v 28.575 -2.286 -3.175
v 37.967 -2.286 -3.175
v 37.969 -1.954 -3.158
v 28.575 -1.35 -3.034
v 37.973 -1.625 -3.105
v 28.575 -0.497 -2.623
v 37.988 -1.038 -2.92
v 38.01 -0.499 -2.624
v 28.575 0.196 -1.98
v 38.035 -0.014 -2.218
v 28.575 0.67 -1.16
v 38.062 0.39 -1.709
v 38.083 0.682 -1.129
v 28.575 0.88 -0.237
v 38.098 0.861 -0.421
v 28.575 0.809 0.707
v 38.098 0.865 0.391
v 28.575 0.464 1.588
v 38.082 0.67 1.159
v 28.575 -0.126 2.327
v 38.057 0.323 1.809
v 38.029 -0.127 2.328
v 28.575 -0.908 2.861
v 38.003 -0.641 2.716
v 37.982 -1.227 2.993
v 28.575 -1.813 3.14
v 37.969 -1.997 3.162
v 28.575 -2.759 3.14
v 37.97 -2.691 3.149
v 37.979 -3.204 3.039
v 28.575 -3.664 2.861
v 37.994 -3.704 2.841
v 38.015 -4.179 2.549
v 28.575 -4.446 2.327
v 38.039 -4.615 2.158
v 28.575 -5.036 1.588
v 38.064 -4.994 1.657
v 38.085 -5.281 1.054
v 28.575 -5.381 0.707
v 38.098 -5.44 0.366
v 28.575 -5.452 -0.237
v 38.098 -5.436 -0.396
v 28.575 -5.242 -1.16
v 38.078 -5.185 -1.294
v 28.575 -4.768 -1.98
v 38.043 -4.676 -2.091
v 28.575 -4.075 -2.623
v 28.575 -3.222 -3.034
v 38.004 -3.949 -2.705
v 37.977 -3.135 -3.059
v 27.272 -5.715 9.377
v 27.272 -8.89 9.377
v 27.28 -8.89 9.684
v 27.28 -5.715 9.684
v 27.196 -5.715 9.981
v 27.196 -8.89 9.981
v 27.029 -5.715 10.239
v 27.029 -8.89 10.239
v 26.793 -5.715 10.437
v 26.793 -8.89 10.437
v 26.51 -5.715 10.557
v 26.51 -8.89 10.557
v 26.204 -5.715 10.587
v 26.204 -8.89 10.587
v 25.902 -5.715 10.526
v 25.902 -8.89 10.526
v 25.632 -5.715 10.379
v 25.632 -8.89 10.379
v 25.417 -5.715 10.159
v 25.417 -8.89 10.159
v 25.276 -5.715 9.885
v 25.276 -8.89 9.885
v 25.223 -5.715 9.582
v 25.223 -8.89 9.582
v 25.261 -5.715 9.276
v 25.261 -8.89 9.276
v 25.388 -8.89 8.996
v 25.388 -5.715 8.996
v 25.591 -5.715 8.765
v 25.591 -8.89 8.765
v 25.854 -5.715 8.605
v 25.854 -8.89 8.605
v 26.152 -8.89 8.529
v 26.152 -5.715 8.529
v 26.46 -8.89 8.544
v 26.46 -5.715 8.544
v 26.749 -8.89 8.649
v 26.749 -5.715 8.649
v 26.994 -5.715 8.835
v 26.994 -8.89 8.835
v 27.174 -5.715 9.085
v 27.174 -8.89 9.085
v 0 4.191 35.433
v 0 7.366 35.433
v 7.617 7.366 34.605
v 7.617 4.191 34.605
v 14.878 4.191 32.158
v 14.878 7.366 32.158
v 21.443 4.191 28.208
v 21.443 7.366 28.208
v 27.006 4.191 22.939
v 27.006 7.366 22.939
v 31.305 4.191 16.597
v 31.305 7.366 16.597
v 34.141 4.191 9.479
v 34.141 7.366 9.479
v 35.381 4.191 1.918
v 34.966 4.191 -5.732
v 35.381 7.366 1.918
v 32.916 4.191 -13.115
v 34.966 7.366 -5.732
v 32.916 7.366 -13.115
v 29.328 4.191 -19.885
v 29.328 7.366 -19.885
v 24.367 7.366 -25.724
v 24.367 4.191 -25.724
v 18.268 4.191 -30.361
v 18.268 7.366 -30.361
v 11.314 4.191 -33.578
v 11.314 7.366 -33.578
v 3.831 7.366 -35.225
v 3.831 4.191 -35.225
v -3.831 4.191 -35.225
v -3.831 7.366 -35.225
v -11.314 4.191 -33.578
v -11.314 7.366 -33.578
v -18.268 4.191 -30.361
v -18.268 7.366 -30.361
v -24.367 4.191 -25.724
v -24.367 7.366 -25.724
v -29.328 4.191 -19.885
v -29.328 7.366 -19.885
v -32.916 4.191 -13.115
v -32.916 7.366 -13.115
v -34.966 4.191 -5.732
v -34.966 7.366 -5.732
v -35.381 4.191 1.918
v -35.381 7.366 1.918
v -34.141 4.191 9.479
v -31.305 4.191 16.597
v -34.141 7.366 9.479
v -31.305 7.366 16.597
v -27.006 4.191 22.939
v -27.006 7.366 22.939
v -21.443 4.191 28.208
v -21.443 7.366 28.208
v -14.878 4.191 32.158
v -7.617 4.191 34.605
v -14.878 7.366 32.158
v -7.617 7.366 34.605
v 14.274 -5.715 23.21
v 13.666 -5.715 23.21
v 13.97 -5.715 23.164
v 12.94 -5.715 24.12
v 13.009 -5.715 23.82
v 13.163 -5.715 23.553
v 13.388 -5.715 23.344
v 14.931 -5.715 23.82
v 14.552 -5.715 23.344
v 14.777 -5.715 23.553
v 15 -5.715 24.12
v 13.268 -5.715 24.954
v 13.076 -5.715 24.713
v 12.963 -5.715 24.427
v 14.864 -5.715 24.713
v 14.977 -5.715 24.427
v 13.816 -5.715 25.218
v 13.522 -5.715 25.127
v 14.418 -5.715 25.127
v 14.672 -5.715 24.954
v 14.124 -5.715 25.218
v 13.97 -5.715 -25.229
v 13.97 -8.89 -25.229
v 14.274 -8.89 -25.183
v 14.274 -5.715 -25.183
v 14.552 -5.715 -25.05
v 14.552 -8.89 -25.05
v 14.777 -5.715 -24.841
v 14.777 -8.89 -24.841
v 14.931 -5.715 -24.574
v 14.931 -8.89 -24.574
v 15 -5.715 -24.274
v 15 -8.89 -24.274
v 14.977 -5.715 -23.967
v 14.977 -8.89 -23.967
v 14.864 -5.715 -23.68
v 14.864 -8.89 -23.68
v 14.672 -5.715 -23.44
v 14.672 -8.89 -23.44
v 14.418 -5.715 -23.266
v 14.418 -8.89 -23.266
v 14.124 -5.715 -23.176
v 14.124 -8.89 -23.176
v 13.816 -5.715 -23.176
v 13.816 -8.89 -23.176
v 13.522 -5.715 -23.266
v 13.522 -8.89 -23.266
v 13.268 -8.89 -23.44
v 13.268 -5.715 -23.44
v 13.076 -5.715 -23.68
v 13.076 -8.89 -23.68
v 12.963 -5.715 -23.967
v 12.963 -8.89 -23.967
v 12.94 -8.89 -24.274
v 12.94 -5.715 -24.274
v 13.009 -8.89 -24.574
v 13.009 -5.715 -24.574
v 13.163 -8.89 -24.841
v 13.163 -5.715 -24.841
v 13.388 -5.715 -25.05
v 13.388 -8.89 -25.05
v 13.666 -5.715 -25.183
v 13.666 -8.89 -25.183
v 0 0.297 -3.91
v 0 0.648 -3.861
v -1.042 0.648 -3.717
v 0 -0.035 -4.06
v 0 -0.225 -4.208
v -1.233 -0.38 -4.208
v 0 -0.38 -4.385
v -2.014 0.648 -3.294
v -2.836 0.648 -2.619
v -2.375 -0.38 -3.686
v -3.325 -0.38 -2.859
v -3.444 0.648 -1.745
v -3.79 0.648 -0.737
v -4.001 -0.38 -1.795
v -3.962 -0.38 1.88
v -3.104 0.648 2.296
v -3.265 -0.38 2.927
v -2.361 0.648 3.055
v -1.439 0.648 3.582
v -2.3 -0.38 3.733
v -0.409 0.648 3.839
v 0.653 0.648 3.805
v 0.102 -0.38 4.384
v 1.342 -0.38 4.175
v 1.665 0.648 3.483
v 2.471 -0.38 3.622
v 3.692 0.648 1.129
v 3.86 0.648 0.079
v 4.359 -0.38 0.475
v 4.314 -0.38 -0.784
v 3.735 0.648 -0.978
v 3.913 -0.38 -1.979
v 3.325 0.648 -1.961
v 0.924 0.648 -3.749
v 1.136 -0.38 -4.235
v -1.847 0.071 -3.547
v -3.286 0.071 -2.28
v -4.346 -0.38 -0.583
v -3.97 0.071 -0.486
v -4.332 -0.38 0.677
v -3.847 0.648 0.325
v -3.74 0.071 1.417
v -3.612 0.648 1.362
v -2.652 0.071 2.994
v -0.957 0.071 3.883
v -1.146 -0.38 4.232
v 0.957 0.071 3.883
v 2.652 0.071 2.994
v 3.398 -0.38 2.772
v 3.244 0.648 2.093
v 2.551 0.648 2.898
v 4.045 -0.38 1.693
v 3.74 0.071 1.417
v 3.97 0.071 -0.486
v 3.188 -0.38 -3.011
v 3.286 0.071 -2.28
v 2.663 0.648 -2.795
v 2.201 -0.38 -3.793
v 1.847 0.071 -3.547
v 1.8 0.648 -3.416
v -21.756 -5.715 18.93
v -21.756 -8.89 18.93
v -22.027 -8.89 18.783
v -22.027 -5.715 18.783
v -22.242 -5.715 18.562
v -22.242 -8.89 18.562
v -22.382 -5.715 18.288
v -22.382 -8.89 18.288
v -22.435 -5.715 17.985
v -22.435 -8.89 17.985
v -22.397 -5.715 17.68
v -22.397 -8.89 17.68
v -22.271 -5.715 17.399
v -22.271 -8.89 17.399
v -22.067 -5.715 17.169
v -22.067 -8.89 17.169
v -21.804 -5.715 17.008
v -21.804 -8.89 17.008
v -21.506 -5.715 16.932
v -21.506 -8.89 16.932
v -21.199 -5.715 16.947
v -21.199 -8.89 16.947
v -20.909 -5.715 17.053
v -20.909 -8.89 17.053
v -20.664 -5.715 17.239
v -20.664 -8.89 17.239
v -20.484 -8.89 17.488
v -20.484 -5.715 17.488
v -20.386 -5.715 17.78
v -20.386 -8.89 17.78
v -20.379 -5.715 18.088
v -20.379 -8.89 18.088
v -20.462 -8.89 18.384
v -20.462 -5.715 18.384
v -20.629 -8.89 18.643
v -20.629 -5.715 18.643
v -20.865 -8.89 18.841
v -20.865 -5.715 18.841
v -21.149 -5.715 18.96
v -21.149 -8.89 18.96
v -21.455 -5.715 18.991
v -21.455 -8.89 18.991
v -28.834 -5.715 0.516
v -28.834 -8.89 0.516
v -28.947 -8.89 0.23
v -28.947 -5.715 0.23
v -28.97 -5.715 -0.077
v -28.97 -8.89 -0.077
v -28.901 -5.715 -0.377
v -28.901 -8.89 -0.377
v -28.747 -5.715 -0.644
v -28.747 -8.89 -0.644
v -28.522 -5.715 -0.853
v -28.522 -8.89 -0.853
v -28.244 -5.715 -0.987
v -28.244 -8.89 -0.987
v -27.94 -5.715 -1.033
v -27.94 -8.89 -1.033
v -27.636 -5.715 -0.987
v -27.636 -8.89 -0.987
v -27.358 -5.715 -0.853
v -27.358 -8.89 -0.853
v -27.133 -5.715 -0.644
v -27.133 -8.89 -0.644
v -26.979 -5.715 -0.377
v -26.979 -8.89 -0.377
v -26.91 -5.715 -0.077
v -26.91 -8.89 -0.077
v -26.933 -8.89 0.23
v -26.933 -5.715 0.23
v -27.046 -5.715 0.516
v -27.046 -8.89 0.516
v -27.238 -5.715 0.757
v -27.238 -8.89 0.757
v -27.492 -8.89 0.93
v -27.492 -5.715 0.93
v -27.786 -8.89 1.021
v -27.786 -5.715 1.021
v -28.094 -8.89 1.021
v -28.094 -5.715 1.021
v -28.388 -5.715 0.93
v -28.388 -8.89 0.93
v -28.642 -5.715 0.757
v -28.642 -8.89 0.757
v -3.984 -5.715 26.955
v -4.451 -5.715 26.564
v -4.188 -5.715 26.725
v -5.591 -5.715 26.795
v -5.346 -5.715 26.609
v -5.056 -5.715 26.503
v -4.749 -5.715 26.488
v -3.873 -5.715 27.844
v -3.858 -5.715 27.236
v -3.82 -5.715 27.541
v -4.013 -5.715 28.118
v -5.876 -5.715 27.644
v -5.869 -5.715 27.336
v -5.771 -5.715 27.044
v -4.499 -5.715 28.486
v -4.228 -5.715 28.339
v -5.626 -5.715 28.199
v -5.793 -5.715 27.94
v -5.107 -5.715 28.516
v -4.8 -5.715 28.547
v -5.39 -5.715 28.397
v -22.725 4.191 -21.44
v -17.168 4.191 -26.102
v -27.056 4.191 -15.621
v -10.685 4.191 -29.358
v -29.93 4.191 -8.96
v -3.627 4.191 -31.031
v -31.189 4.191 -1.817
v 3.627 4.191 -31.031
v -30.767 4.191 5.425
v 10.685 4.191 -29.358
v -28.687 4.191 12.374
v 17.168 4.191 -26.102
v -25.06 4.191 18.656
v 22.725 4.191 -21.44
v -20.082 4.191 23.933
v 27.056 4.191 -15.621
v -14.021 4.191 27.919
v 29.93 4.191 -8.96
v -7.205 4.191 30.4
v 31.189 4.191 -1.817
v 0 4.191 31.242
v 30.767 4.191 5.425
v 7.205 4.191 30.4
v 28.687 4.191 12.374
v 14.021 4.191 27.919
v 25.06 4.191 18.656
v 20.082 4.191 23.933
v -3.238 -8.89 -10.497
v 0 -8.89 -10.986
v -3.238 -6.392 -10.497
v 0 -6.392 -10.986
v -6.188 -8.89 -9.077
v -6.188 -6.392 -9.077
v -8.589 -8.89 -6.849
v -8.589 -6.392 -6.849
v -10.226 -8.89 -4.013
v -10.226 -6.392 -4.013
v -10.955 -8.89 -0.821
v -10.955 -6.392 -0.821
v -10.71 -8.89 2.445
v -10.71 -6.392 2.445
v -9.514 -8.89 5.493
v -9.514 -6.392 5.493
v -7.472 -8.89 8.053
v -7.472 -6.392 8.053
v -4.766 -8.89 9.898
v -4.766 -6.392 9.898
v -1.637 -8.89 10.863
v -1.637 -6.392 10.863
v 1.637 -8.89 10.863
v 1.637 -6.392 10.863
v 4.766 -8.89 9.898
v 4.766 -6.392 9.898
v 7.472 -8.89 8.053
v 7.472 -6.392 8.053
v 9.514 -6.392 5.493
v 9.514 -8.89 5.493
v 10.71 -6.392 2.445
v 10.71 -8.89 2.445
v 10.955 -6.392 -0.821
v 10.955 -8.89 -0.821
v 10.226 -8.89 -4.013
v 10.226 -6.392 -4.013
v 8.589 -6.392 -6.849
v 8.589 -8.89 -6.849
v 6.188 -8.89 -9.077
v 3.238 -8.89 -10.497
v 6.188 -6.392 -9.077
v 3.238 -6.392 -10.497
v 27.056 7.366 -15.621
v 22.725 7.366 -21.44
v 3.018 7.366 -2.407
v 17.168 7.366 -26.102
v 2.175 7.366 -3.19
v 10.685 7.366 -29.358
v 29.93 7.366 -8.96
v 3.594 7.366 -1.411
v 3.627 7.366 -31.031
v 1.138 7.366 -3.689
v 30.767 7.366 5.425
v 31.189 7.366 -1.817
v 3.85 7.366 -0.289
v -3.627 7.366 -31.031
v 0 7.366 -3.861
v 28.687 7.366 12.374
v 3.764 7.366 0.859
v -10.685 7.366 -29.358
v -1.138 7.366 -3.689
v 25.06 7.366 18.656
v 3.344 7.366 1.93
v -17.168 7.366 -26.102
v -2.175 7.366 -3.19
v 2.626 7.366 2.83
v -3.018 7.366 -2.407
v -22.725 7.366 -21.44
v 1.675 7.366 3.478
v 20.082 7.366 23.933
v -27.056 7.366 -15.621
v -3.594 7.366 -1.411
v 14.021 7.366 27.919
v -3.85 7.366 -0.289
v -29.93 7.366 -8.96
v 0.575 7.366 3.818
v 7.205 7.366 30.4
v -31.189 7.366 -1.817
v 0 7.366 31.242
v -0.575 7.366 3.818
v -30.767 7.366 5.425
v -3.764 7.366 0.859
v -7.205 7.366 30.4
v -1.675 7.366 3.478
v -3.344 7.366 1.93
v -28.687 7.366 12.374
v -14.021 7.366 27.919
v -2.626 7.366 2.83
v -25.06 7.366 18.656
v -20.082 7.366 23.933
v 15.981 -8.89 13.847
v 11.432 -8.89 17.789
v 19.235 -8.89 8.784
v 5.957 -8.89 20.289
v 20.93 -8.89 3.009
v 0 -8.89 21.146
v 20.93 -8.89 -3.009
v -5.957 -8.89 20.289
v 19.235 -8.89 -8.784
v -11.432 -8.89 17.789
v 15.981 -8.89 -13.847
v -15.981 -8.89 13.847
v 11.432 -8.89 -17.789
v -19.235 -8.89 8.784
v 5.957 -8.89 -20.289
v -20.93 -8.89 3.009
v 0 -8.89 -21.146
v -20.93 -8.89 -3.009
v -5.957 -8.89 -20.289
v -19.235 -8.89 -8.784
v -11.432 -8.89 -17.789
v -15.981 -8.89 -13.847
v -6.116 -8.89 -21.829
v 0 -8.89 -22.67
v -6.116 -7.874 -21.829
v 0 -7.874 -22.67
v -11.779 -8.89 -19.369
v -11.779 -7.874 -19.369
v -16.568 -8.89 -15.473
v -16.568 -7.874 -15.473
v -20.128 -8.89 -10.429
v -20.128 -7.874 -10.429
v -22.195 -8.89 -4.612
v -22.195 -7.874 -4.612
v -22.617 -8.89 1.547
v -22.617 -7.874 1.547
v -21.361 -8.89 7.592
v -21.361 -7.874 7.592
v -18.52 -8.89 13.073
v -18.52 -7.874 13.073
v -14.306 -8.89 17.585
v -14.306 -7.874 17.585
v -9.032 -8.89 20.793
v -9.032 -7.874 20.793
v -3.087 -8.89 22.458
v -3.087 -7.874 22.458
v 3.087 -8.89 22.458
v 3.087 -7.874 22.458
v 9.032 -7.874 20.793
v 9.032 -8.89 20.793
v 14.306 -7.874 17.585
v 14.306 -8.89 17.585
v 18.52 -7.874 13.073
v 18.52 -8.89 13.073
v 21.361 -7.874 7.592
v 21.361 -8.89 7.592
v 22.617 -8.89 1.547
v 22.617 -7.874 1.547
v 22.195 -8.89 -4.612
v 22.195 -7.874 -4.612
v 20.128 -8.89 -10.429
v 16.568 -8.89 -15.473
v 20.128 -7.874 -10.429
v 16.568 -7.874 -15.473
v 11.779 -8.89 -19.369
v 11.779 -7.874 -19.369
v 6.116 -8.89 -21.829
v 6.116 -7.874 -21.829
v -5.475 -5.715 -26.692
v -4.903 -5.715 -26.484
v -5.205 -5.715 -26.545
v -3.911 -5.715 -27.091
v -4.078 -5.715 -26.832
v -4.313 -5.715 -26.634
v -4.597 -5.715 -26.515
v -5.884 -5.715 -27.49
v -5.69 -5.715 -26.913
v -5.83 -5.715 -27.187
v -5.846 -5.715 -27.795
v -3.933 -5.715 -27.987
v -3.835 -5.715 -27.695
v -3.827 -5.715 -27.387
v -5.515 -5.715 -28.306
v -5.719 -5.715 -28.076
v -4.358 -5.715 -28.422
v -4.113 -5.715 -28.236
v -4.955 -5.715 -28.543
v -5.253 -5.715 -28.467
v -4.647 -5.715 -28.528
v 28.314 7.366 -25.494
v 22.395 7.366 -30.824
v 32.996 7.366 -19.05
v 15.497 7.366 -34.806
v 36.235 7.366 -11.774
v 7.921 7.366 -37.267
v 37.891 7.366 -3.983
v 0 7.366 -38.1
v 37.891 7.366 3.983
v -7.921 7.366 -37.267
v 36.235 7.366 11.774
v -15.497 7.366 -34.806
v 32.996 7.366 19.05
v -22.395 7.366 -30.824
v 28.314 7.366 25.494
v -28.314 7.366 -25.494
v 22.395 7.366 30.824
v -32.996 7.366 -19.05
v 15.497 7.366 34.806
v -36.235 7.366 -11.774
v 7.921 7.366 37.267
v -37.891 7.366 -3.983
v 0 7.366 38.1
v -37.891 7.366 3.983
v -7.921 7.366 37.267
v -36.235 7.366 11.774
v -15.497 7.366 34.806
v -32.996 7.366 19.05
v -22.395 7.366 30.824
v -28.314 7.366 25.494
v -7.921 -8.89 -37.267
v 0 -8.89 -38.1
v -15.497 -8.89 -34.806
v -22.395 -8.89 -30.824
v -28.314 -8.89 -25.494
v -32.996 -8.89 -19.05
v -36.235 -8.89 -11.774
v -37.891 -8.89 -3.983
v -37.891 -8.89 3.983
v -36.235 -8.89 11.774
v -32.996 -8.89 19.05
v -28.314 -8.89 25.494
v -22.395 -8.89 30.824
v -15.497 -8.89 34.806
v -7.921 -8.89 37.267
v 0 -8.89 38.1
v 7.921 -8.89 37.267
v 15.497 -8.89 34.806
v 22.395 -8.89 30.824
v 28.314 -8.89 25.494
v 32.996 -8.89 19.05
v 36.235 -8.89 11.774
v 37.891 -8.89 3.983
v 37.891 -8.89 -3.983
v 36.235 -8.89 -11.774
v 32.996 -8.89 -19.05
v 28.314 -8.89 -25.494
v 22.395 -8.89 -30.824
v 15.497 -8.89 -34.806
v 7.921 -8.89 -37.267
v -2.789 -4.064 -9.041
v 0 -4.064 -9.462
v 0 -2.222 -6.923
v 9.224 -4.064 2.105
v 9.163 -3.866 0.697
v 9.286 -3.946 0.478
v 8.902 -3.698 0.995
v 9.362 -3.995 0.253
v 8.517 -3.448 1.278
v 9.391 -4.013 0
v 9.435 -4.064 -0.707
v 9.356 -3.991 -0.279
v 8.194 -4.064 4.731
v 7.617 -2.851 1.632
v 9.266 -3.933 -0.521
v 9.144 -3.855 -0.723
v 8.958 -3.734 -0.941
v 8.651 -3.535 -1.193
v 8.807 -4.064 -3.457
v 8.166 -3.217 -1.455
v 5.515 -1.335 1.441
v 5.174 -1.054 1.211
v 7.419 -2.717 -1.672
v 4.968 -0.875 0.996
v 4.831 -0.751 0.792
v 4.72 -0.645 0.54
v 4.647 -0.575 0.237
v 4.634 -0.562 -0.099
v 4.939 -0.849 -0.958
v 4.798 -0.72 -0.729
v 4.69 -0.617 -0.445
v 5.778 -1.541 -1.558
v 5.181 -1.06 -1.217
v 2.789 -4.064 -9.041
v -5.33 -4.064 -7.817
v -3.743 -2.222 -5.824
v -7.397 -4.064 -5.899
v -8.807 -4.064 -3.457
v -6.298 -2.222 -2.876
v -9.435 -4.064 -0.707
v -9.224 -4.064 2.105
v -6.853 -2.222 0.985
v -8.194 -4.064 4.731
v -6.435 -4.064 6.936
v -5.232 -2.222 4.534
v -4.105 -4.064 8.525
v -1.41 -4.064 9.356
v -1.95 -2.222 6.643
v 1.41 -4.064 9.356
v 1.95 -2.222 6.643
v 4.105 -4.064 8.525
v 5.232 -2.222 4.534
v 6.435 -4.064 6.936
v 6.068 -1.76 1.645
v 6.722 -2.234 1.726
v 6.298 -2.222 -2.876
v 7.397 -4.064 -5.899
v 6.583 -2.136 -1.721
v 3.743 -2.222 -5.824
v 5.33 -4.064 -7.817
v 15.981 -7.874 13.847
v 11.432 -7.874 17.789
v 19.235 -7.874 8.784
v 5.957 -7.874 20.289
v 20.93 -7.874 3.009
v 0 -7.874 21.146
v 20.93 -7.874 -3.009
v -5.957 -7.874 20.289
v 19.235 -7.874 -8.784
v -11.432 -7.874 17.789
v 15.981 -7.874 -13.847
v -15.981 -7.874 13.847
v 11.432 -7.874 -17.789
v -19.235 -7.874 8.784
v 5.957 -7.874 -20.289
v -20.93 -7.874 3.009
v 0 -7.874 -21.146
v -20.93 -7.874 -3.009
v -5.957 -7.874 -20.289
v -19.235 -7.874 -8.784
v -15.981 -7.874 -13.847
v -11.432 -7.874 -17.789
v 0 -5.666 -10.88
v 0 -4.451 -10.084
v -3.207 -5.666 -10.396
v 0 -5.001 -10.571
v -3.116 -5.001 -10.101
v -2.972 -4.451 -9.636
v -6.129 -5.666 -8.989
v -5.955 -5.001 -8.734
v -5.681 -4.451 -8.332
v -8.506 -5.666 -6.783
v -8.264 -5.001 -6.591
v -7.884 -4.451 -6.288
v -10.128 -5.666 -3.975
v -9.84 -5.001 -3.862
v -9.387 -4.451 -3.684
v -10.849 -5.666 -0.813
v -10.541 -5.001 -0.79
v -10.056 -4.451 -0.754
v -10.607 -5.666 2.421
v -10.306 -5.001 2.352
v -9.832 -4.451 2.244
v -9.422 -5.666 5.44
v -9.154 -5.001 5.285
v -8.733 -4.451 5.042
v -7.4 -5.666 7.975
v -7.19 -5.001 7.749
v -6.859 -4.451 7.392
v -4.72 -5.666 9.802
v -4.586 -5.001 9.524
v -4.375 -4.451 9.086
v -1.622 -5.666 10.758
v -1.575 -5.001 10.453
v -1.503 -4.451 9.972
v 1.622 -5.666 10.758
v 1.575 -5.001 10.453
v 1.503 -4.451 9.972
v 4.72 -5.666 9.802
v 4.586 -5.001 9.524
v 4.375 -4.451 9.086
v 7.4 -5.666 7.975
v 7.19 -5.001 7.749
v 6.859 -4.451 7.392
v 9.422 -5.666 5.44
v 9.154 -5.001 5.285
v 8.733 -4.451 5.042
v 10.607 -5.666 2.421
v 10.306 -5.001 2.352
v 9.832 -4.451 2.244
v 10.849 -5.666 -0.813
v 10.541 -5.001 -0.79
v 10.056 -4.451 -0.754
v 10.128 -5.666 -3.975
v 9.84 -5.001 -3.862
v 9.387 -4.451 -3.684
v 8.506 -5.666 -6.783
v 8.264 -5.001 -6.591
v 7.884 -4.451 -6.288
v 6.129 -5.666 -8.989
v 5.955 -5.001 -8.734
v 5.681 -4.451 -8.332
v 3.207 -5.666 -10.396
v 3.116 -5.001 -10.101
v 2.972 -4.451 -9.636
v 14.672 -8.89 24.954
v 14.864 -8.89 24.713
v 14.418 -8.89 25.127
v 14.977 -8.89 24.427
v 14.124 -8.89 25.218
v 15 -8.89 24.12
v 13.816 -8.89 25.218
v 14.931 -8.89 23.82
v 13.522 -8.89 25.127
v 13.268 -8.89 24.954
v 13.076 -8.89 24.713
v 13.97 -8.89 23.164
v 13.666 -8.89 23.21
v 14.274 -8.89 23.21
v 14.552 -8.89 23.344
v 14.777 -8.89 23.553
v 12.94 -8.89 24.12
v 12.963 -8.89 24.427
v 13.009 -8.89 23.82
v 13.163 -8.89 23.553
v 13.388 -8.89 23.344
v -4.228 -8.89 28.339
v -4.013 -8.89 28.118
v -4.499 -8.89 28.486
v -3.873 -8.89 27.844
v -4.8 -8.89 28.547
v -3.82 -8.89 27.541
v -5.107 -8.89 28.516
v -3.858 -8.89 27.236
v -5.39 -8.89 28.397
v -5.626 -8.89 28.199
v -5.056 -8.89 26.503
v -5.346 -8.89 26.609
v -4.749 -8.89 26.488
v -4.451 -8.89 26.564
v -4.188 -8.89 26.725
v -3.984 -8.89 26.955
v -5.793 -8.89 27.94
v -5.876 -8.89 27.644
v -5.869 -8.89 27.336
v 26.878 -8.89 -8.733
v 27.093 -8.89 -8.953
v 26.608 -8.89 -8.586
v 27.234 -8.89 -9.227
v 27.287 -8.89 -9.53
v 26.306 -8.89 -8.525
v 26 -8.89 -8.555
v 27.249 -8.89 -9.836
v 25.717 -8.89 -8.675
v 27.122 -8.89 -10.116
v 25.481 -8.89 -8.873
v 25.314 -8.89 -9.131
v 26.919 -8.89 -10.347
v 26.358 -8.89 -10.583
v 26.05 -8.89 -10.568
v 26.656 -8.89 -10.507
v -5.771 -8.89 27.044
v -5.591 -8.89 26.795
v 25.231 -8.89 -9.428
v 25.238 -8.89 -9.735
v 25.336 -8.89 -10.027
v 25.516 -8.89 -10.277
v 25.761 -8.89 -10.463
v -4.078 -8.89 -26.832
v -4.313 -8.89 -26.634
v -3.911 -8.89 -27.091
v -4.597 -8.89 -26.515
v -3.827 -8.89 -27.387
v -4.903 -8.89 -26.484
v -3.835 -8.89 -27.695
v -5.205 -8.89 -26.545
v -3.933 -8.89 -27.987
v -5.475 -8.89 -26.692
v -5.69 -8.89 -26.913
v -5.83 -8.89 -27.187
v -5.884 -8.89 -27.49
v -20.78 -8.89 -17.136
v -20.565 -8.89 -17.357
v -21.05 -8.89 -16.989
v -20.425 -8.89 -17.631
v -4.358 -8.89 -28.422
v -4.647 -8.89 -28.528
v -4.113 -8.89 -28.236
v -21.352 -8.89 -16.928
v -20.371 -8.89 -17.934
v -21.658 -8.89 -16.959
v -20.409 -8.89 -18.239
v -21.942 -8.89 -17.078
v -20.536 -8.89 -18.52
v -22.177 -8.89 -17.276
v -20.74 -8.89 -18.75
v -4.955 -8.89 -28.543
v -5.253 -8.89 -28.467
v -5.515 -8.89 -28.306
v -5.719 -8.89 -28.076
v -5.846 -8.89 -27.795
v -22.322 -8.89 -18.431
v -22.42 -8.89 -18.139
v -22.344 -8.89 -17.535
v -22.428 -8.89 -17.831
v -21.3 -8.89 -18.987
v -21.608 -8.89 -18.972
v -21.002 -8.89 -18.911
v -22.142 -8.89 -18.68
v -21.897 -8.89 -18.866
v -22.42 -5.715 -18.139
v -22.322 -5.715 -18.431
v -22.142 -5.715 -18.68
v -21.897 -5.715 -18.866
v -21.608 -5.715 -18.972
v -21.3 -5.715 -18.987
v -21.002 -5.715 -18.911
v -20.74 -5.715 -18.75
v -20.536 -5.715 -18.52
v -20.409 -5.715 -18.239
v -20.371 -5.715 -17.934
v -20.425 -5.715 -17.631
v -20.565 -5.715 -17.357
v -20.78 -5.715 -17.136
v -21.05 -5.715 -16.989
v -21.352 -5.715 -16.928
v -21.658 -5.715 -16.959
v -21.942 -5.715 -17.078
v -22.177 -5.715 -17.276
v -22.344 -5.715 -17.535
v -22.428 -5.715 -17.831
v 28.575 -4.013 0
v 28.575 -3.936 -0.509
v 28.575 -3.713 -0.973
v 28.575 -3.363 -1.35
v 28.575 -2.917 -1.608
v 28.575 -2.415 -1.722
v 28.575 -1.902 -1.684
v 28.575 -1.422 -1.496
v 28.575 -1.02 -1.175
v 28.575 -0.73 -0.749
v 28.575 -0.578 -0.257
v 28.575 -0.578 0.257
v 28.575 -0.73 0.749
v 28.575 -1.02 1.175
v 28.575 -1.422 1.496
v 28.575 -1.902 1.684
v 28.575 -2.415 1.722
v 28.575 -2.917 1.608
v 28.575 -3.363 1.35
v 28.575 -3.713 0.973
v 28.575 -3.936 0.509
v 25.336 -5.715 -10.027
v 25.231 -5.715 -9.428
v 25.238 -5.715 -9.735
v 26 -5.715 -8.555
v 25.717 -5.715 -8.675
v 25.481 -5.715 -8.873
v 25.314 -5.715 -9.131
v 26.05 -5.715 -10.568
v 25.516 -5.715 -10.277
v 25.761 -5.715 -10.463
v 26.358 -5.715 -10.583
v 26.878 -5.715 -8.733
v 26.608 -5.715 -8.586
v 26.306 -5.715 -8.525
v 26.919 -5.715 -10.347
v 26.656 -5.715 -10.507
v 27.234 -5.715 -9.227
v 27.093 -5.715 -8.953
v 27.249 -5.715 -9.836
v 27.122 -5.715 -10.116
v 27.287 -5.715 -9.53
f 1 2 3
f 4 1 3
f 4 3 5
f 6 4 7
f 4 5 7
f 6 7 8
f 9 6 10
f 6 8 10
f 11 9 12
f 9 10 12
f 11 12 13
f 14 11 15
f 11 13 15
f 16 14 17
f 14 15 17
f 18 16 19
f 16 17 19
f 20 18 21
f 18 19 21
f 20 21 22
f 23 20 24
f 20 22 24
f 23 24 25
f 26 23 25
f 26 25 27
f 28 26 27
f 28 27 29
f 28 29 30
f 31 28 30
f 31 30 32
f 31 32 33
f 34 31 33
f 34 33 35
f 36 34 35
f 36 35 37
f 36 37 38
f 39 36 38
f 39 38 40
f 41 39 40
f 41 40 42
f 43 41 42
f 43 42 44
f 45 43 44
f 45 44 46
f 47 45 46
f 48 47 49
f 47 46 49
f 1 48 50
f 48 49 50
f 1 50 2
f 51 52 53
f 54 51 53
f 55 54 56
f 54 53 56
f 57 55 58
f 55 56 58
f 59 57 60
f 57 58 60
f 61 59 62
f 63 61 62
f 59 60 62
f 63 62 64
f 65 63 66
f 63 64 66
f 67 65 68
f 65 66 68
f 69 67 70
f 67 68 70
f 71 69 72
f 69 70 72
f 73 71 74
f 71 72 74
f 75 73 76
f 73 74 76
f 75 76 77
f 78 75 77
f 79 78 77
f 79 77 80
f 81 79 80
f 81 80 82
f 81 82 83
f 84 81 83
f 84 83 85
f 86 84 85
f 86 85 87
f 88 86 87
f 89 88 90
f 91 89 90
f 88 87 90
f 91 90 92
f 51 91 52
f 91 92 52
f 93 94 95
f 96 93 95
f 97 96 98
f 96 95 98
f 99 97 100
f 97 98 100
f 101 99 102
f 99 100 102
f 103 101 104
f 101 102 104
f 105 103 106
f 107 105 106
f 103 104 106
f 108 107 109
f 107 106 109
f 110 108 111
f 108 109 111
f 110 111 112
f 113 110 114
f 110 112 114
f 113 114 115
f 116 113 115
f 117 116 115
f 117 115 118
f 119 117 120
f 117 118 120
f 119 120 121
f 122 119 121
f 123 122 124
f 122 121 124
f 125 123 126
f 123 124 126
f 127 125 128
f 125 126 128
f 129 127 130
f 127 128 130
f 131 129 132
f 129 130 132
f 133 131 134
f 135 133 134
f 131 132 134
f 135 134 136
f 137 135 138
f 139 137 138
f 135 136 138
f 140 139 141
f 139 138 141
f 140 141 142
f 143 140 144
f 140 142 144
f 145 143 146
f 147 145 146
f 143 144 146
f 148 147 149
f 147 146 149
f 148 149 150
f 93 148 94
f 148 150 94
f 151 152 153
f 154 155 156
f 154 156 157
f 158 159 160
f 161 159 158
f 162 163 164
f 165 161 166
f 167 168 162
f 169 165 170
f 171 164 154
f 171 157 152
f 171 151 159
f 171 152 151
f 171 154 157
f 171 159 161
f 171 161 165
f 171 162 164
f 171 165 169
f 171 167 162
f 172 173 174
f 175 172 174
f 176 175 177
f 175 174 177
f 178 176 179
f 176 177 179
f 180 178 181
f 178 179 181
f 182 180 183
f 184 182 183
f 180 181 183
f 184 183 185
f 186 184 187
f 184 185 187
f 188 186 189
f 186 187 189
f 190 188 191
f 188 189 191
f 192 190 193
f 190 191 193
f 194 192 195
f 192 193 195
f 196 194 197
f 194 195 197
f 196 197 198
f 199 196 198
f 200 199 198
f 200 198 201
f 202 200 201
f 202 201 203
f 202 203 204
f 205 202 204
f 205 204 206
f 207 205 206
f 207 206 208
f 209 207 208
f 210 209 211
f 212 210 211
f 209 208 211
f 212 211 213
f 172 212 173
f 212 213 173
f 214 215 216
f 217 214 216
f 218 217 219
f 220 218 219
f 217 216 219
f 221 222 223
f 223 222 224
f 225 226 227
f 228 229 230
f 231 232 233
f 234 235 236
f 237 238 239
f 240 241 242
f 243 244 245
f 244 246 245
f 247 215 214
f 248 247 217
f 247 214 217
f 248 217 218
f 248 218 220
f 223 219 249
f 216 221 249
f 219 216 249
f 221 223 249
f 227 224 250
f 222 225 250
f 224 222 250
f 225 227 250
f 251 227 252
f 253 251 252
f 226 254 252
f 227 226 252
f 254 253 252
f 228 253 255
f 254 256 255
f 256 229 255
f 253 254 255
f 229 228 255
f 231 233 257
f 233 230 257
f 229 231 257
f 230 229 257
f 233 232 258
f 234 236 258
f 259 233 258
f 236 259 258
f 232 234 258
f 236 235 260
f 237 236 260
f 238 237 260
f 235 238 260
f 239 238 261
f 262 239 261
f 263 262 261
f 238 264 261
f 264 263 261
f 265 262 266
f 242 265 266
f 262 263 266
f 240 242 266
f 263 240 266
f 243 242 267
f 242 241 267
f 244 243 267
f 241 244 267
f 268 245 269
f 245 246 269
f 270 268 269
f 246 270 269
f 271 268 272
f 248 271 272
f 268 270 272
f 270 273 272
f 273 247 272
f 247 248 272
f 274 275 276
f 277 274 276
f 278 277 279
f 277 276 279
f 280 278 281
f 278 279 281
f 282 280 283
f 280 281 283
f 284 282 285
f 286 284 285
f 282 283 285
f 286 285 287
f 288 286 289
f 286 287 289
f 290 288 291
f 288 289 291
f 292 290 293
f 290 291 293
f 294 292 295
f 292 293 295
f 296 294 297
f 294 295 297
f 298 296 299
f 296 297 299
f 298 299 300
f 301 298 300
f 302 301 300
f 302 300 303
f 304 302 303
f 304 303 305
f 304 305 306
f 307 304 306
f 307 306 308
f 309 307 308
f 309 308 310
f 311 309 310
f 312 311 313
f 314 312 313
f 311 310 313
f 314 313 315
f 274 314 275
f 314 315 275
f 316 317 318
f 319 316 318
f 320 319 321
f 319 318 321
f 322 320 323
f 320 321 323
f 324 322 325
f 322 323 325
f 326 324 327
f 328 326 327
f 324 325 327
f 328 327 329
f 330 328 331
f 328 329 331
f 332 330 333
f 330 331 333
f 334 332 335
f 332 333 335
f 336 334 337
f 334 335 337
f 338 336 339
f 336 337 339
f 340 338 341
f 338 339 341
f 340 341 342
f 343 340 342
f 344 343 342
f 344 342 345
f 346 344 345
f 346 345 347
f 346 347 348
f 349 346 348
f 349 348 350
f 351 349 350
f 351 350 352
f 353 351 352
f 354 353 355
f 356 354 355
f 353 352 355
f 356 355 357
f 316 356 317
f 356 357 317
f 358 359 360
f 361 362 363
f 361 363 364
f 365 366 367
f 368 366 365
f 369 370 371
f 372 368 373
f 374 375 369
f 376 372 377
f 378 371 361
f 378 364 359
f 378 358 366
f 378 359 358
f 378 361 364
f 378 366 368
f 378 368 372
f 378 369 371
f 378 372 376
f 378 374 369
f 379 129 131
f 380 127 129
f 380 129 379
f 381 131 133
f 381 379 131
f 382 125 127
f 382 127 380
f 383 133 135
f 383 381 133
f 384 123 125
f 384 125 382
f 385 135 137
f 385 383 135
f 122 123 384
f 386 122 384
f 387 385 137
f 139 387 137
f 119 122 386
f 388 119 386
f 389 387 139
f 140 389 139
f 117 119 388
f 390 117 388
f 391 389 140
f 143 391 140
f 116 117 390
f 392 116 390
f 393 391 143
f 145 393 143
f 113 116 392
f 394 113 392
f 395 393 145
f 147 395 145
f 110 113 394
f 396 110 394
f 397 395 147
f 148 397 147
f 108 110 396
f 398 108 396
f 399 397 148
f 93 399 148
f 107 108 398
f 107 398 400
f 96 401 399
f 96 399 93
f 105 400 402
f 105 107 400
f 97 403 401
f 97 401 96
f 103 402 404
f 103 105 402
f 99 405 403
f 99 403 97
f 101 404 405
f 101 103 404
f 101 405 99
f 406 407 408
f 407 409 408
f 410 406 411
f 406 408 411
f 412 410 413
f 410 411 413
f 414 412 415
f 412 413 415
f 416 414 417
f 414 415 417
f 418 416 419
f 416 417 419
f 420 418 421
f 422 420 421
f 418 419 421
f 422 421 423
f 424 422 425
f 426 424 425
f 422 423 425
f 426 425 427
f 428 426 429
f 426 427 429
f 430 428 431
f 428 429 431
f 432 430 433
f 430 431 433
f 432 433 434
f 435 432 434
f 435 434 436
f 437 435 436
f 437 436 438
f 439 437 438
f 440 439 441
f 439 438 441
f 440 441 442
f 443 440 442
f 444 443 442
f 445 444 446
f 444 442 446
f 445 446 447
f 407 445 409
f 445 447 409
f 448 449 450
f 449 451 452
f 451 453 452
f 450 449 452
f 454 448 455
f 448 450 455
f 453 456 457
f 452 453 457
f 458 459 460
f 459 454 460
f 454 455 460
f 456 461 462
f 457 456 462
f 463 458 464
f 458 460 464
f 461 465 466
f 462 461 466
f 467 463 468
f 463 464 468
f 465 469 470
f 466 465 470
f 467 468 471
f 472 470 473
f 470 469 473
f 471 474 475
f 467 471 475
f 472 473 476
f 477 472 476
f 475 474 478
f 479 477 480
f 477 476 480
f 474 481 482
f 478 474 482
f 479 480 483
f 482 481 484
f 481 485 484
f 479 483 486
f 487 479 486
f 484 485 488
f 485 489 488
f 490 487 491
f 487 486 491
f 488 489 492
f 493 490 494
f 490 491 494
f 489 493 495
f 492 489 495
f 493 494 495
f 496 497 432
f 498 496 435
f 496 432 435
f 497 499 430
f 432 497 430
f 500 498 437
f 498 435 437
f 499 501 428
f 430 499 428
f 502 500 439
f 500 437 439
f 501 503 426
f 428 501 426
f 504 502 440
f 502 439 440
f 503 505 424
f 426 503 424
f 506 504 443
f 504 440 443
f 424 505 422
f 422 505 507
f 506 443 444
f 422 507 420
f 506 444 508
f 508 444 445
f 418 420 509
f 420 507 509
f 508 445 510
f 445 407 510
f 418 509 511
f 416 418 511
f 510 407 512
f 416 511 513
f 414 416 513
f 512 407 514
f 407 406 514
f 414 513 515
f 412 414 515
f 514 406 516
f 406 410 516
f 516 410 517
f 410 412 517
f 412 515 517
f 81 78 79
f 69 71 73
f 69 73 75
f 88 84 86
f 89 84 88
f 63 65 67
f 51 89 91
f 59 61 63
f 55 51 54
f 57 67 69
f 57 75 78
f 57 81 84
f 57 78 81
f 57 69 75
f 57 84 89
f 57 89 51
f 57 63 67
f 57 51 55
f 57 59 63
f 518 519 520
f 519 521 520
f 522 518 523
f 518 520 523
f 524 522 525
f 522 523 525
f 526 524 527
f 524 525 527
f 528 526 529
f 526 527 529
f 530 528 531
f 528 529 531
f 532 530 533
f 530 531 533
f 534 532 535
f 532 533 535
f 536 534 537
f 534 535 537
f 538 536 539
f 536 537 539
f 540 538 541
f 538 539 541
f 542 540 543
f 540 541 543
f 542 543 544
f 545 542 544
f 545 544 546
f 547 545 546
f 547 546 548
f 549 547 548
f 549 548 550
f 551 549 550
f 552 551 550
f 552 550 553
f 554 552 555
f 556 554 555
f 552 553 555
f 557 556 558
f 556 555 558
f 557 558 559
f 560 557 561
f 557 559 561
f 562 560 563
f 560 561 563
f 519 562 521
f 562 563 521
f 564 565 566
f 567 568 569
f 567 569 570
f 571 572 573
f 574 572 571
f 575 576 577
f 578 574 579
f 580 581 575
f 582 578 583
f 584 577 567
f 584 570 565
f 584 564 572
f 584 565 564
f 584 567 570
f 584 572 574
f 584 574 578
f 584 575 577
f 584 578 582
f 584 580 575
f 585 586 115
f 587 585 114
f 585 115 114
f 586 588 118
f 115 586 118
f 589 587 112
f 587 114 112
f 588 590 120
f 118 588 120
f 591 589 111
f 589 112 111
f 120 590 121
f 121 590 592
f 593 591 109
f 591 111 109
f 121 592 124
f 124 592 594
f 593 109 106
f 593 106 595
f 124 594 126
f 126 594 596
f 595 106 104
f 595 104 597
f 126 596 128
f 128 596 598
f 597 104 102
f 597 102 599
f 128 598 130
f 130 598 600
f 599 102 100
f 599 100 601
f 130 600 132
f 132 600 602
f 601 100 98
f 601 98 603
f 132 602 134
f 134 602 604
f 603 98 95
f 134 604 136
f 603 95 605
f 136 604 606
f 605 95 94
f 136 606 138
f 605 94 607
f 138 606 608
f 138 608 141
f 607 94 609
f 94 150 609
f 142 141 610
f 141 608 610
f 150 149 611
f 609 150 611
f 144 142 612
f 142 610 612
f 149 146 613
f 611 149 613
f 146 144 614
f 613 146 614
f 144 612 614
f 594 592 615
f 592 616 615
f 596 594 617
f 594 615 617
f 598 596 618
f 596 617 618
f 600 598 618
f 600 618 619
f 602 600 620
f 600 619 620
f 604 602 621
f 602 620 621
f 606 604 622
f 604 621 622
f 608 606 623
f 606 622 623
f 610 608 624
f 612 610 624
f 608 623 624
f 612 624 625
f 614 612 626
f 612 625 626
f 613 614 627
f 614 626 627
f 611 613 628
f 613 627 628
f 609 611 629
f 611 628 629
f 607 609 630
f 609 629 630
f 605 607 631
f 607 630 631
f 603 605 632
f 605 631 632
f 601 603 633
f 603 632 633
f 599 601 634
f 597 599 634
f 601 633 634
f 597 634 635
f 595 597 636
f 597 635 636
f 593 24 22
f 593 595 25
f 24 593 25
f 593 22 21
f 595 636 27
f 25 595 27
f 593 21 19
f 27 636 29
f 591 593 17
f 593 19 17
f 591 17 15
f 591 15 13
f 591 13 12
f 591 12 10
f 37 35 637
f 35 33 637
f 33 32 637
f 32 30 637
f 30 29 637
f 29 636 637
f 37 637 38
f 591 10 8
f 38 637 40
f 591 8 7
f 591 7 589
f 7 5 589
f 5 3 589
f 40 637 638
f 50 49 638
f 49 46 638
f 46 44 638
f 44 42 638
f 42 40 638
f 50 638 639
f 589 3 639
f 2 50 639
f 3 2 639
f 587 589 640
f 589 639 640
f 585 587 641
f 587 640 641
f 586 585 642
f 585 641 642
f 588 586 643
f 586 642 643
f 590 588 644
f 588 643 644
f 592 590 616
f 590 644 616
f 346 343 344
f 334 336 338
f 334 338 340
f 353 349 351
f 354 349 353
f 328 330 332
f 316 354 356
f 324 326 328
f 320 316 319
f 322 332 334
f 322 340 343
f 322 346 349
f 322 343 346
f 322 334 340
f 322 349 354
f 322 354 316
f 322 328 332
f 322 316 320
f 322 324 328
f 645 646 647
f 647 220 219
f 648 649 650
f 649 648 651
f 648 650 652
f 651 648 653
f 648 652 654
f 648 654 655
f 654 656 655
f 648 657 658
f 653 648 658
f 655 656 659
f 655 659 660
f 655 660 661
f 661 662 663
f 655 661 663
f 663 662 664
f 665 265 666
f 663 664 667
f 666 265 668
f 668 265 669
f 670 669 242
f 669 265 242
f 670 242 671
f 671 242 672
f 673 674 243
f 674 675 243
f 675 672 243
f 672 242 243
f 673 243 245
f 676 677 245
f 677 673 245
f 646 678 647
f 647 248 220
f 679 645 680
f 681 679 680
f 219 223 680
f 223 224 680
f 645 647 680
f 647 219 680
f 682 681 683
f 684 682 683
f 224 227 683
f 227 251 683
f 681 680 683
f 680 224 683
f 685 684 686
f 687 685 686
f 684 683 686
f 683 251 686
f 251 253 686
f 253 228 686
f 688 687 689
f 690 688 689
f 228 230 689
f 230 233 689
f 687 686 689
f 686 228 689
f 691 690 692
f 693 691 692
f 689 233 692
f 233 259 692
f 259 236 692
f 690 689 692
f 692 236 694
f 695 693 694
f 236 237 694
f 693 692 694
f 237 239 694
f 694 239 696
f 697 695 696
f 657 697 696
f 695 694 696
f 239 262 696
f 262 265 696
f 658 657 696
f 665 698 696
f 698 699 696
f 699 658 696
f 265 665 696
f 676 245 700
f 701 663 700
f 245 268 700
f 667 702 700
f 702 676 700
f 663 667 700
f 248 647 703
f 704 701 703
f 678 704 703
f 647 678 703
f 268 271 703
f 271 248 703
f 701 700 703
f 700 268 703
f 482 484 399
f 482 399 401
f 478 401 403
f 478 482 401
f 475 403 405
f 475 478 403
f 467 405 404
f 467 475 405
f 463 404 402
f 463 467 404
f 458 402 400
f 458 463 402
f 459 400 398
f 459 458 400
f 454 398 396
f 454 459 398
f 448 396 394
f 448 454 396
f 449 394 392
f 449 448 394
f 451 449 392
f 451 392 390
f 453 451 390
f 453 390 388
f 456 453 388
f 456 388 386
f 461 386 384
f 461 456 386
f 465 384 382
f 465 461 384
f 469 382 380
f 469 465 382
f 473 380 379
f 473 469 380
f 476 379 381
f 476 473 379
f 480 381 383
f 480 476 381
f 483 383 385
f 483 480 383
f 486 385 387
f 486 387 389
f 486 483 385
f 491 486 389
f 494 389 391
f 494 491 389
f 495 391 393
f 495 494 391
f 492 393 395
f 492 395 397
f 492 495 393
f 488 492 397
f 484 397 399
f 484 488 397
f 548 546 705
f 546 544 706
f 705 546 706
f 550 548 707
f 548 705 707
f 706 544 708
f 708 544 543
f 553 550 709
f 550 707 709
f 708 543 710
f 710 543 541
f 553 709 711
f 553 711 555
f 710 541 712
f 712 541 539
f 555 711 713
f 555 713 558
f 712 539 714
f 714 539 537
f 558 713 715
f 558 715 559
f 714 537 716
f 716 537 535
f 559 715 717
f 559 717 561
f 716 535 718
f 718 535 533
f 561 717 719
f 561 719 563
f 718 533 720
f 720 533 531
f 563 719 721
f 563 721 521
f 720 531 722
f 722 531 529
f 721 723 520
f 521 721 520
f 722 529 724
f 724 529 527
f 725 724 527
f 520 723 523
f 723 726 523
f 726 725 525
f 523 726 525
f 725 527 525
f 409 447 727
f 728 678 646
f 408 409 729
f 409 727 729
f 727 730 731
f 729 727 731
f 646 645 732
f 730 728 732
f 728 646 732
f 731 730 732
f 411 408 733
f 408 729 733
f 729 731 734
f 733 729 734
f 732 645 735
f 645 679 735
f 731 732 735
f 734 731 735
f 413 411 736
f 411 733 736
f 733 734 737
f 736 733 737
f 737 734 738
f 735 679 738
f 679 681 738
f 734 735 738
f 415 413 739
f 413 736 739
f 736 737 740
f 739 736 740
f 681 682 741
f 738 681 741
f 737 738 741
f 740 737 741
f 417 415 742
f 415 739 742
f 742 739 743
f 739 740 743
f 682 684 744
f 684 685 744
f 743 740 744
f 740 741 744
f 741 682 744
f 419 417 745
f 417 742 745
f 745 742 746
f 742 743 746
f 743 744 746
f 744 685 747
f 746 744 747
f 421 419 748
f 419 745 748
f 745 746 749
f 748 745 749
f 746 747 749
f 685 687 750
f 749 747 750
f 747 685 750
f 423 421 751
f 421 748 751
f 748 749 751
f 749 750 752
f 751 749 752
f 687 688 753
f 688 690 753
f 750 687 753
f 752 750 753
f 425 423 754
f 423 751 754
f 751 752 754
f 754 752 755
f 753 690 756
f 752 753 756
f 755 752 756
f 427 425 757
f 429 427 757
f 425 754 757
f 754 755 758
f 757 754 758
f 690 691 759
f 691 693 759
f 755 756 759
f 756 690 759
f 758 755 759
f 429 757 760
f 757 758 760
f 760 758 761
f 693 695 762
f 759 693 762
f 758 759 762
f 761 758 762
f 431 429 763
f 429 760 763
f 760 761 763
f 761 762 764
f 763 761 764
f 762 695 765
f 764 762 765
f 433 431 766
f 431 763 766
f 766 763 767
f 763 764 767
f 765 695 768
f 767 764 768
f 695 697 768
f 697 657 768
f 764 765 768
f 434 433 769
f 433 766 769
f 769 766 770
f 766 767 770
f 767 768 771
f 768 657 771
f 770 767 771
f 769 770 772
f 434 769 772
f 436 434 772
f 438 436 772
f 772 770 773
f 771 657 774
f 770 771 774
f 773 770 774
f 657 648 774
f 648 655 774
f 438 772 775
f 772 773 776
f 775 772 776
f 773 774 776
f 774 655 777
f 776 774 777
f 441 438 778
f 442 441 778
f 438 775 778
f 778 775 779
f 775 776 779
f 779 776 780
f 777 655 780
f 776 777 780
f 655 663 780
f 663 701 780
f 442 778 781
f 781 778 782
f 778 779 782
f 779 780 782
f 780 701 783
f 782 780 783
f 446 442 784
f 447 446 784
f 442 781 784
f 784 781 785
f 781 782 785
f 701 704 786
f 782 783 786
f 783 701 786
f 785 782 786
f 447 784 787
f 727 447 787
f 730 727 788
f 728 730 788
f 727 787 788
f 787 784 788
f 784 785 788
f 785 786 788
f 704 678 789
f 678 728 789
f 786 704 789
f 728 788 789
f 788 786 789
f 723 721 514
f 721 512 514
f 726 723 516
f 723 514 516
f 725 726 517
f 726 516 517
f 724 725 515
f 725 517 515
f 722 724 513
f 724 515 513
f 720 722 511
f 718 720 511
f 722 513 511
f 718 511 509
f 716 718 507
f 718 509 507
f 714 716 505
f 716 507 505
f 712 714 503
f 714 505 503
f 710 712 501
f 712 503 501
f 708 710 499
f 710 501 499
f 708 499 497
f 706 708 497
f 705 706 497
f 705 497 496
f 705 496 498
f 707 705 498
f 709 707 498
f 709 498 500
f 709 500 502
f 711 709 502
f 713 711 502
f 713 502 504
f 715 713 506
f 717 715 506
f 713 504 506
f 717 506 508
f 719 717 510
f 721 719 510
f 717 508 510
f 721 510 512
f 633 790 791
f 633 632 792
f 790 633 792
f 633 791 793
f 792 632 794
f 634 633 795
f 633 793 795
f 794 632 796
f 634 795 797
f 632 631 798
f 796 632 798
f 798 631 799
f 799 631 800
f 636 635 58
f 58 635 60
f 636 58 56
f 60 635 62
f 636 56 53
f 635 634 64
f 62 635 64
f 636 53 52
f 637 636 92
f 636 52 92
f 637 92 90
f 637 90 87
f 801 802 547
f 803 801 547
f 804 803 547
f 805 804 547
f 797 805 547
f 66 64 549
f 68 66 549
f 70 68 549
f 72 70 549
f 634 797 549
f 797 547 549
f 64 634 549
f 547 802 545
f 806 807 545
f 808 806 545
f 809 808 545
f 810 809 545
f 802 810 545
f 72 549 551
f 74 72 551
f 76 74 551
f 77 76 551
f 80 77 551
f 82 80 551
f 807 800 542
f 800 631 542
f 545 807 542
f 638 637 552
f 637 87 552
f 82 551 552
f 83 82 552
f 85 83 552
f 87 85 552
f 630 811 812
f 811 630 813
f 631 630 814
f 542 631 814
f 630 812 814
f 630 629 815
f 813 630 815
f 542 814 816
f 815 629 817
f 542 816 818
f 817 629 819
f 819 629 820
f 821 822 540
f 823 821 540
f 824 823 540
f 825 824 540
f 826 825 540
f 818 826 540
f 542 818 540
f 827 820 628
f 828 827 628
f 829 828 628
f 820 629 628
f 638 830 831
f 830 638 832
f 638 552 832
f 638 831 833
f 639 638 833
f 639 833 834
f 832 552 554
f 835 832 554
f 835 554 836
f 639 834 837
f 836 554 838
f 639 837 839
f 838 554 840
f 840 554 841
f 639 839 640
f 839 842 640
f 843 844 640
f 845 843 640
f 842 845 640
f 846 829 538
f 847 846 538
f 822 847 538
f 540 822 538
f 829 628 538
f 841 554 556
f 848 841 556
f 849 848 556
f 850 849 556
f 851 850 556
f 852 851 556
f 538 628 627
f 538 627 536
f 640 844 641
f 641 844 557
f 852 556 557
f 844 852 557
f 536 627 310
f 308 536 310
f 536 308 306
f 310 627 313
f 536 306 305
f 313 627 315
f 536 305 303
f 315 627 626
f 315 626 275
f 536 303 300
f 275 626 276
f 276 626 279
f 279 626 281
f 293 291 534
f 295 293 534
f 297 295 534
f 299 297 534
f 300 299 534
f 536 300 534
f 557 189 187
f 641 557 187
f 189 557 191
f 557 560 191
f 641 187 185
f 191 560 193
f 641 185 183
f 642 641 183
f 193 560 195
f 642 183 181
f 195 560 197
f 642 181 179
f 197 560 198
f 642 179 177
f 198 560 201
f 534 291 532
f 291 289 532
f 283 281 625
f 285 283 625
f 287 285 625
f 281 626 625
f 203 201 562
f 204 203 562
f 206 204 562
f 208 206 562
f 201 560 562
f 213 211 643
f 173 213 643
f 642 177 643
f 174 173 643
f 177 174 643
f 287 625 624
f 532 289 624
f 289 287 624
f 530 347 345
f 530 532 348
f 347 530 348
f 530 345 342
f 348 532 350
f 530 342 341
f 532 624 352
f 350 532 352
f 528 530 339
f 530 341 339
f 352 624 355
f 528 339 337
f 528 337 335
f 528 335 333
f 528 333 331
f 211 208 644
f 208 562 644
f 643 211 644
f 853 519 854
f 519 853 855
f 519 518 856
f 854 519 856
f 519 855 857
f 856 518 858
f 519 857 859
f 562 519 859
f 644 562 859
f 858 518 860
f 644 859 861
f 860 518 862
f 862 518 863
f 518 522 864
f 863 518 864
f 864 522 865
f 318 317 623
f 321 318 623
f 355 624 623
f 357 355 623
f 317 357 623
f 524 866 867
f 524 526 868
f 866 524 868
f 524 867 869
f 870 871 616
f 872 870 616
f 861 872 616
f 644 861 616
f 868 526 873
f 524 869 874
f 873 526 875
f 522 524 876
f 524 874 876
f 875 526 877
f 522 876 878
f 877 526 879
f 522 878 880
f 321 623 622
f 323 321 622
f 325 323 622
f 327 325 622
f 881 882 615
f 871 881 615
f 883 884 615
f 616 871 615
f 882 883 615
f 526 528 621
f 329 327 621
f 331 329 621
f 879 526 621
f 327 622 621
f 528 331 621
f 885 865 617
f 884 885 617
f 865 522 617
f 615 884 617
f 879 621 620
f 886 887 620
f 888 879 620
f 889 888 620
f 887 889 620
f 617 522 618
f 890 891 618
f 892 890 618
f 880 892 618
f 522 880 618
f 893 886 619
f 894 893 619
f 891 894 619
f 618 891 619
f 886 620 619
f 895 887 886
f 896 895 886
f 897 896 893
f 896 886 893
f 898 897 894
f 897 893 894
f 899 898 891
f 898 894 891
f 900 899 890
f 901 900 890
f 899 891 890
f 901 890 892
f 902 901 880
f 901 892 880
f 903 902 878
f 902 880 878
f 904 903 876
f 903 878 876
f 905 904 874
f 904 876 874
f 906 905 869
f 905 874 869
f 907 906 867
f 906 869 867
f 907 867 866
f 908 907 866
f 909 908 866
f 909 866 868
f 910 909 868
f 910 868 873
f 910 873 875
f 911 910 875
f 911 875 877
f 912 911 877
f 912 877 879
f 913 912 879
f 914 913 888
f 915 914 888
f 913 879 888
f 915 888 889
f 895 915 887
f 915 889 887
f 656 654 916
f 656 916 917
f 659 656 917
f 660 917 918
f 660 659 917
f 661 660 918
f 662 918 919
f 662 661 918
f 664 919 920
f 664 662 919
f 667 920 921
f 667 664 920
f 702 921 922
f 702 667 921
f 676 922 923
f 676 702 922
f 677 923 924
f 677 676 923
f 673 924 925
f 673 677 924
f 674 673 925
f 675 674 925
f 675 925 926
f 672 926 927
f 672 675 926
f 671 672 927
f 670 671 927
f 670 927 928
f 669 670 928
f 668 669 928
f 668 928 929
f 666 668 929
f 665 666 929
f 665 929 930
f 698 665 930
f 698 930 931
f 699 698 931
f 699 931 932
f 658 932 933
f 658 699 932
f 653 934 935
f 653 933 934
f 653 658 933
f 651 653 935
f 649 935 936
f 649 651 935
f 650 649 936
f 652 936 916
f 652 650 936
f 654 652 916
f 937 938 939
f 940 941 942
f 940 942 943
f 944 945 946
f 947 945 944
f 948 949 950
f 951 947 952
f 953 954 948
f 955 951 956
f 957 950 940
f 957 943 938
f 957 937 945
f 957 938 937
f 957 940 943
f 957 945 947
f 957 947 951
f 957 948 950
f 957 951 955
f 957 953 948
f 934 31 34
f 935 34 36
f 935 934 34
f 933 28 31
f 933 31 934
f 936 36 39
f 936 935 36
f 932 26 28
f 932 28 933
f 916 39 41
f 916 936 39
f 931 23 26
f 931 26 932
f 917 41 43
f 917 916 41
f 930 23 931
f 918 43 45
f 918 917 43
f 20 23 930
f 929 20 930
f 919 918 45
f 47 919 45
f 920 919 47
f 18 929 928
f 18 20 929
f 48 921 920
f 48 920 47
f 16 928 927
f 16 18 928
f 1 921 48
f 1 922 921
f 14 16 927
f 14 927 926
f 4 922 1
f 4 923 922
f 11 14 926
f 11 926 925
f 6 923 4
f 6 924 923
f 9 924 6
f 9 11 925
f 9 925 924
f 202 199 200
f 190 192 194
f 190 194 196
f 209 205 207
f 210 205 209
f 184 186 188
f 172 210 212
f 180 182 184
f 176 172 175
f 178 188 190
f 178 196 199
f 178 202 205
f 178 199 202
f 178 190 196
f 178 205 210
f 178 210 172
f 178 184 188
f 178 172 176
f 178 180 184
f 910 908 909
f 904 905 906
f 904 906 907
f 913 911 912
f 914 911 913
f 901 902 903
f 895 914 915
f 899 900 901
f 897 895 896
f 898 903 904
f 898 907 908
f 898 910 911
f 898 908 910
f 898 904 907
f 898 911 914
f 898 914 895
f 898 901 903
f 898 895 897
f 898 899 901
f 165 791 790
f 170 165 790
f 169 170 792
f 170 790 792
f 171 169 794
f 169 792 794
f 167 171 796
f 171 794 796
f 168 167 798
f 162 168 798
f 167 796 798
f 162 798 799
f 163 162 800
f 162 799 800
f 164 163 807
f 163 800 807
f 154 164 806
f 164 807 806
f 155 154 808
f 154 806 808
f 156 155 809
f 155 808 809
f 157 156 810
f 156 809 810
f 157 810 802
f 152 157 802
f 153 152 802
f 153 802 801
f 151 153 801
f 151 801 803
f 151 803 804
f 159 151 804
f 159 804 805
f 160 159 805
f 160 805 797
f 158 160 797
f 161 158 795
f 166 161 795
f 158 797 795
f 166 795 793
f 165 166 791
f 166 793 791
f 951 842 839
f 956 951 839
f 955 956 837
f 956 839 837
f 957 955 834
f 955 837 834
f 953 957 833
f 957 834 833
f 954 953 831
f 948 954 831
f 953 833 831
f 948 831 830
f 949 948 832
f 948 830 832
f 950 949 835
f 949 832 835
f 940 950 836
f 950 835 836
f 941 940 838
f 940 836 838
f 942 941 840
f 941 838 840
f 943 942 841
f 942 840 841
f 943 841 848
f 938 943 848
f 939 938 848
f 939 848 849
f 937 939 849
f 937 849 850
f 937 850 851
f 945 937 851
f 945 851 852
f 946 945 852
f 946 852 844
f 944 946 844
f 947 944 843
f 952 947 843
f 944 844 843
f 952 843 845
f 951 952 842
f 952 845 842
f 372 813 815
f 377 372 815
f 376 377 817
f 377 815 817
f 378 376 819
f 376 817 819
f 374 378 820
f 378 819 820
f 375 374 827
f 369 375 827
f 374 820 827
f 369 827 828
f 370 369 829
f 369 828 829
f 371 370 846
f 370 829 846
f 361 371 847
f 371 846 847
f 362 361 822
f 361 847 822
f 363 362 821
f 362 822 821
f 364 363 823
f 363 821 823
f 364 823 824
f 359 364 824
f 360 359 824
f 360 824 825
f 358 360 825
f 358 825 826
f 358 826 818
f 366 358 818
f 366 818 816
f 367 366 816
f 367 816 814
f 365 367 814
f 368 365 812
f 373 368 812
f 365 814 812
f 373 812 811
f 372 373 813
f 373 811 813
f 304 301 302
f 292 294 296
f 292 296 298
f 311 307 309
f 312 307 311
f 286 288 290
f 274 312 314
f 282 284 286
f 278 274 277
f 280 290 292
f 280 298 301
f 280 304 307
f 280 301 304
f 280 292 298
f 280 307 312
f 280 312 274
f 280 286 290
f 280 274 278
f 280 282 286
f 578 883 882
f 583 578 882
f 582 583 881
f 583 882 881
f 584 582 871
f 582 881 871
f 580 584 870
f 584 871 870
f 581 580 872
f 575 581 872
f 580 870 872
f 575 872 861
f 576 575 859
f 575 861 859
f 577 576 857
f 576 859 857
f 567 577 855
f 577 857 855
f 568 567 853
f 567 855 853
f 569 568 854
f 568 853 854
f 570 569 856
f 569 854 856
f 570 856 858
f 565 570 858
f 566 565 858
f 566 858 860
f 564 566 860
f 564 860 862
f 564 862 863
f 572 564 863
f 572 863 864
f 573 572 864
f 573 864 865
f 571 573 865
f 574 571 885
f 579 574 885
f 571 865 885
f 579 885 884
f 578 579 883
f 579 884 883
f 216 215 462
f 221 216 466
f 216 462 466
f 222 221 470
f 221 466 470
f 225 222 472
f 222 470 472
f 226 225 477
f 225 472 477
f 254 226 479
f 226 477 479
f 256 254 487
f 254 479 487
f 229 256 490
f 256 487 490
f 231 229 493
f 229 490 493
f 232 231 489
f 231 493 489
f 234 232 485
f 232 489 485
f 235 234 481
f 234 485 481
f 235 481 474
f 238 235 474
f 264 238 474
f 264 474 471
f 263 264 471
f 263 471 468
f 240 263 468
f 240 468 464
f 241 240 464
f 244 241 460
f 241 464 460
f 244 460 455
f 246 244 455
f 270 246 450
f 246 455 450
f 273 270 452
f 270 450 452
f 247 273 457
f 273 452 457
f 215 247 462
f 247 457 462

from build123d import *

# Parameters (mm, degrees)
SKETCH2_R          = 1.7272
CUT_EXTRUDE1_DEPTH = 55.61
SKETCH3_R          = 35.433
SKETCH3_R_2        = 31.242
CUT_EXTRUDE2_DEPTH = 3.175
SKETCH4_R          = 1.03251
CUT_EXTRUDE3_DEPTH = 3.175
CIRPATTERN1_COUNT  = 9
SKETCH5_R          = 3.175
CUT_EXTRUDE4_DEPTH = 9.525
FILLET1_R          = 1.27


with BuildPart() as part:
    # Sketch1 → Revolve1 (revolve)
    with BuildSketch(Plane.XY):
        with BuildLine():
            Line((3.8608, 7.366), (38.1, 7.366))
            Line((38.1, 7.366), (38.1, -8.89))
            Line((38.1, -8.89), (22.6695, -8.89))
            Line((22.6695, -8.89), (22.6695, -7.874))
            Line((22.6695, -7.874), (21.1455, -7.874))
            Line((21.1455, -7.874), (21.1455, -8.89))
            Line((21.1455, -8.89), (10.9855, -8.89))
            Line((10.9855, -8.89), (10.9855, -6.391948453))
            ThreePointArc((10.9855, -6.391948453), (10.570616467, -5.000733157), (9.4615, -4.064))
            Line((9.4615, -4.064), (3.8608, 0))
            Line((3.8608, 0), (3.8608, 7.366))
        make_face()
    revolve(axis=Axis((0, 101.60464546, 0), (0, 1, 0)))

    # Sketch2 → Cut-Extrude1 (cut, through all)
    with BuildSketch(Plane(origin=(0, 0, 0), x_dir=(0, 0, -1), z_dir=(1, 0, 0))):
        with Locations((0, -2.286)):
            Circle(SKETCH2_R)
    extrude(amount=CUT_EXTRUDE1_DEPTH, mode=Mode.SUBTRACT)

    # Sketch3 → Cut-Extrude2 (cut)
    with BuildSketch(Plane(origin=(0, 7.366, 0), x_dir=(1, 0, 0), z_dir=(0, 1, 0))):
        Circle(SKETCH3_R)
        Circle(SKETCH3_R_2, mode=Mode.SUBTRACT)
    extrude(amount=-CUT_EXTRUDE2_DEPTH, mode=Mode.SUBTRACT)

    # Sketch4 → Cut-Extrude3 (cut)
    with BuildSketch(Plane(origin=(0, -8.89, 0), x_dir=(-1, 0, 0), z_dir=(0, -1, 0))):
        with Locations((-13.97, 24.196749782)):
            Circle(SKETCH4_R)
    cut_extrude3 = extrude(amount=-CUT_EXTRUDE3_DEPTH, mode=Mode.SUBTRACT)

    # CirPattern1: Cut-Extrude3 ×9 about axis
    cirpattern1_axis = Axis((0, 7.366, 0), (0, -1, 0))
    for i in range(1, CIRPATTERN1_COUNT):
        add(cut_extrude3.rotate(cirpattern1_axis, i * 360 / CIRPATTERN1_COUNT), mode=Mode.SUBTRACT)

    # Sketch5 → Cut-Extrude4 (cut)
    with BuildSketch(Plane(origin=(38.1, 0, 0), x_dir=(0, 0, -1), z_dir=(1, 0, 0))):
        with Locations((0, -2.286)):
            Circle(SKETCH5_R)
    extrude(amount=-CUT_EXTRUDE4_DEPTH, mode=Mode.SUBTRACT)

    # Fillet1
    fillet1_edges = [part.edges().sort_by_distance(p)[0] for p in [
        (-3.8608, 0, 0),
    ]]
    fillet(fillet1_edges, radius=FILLET1_R)


solid = part.part
